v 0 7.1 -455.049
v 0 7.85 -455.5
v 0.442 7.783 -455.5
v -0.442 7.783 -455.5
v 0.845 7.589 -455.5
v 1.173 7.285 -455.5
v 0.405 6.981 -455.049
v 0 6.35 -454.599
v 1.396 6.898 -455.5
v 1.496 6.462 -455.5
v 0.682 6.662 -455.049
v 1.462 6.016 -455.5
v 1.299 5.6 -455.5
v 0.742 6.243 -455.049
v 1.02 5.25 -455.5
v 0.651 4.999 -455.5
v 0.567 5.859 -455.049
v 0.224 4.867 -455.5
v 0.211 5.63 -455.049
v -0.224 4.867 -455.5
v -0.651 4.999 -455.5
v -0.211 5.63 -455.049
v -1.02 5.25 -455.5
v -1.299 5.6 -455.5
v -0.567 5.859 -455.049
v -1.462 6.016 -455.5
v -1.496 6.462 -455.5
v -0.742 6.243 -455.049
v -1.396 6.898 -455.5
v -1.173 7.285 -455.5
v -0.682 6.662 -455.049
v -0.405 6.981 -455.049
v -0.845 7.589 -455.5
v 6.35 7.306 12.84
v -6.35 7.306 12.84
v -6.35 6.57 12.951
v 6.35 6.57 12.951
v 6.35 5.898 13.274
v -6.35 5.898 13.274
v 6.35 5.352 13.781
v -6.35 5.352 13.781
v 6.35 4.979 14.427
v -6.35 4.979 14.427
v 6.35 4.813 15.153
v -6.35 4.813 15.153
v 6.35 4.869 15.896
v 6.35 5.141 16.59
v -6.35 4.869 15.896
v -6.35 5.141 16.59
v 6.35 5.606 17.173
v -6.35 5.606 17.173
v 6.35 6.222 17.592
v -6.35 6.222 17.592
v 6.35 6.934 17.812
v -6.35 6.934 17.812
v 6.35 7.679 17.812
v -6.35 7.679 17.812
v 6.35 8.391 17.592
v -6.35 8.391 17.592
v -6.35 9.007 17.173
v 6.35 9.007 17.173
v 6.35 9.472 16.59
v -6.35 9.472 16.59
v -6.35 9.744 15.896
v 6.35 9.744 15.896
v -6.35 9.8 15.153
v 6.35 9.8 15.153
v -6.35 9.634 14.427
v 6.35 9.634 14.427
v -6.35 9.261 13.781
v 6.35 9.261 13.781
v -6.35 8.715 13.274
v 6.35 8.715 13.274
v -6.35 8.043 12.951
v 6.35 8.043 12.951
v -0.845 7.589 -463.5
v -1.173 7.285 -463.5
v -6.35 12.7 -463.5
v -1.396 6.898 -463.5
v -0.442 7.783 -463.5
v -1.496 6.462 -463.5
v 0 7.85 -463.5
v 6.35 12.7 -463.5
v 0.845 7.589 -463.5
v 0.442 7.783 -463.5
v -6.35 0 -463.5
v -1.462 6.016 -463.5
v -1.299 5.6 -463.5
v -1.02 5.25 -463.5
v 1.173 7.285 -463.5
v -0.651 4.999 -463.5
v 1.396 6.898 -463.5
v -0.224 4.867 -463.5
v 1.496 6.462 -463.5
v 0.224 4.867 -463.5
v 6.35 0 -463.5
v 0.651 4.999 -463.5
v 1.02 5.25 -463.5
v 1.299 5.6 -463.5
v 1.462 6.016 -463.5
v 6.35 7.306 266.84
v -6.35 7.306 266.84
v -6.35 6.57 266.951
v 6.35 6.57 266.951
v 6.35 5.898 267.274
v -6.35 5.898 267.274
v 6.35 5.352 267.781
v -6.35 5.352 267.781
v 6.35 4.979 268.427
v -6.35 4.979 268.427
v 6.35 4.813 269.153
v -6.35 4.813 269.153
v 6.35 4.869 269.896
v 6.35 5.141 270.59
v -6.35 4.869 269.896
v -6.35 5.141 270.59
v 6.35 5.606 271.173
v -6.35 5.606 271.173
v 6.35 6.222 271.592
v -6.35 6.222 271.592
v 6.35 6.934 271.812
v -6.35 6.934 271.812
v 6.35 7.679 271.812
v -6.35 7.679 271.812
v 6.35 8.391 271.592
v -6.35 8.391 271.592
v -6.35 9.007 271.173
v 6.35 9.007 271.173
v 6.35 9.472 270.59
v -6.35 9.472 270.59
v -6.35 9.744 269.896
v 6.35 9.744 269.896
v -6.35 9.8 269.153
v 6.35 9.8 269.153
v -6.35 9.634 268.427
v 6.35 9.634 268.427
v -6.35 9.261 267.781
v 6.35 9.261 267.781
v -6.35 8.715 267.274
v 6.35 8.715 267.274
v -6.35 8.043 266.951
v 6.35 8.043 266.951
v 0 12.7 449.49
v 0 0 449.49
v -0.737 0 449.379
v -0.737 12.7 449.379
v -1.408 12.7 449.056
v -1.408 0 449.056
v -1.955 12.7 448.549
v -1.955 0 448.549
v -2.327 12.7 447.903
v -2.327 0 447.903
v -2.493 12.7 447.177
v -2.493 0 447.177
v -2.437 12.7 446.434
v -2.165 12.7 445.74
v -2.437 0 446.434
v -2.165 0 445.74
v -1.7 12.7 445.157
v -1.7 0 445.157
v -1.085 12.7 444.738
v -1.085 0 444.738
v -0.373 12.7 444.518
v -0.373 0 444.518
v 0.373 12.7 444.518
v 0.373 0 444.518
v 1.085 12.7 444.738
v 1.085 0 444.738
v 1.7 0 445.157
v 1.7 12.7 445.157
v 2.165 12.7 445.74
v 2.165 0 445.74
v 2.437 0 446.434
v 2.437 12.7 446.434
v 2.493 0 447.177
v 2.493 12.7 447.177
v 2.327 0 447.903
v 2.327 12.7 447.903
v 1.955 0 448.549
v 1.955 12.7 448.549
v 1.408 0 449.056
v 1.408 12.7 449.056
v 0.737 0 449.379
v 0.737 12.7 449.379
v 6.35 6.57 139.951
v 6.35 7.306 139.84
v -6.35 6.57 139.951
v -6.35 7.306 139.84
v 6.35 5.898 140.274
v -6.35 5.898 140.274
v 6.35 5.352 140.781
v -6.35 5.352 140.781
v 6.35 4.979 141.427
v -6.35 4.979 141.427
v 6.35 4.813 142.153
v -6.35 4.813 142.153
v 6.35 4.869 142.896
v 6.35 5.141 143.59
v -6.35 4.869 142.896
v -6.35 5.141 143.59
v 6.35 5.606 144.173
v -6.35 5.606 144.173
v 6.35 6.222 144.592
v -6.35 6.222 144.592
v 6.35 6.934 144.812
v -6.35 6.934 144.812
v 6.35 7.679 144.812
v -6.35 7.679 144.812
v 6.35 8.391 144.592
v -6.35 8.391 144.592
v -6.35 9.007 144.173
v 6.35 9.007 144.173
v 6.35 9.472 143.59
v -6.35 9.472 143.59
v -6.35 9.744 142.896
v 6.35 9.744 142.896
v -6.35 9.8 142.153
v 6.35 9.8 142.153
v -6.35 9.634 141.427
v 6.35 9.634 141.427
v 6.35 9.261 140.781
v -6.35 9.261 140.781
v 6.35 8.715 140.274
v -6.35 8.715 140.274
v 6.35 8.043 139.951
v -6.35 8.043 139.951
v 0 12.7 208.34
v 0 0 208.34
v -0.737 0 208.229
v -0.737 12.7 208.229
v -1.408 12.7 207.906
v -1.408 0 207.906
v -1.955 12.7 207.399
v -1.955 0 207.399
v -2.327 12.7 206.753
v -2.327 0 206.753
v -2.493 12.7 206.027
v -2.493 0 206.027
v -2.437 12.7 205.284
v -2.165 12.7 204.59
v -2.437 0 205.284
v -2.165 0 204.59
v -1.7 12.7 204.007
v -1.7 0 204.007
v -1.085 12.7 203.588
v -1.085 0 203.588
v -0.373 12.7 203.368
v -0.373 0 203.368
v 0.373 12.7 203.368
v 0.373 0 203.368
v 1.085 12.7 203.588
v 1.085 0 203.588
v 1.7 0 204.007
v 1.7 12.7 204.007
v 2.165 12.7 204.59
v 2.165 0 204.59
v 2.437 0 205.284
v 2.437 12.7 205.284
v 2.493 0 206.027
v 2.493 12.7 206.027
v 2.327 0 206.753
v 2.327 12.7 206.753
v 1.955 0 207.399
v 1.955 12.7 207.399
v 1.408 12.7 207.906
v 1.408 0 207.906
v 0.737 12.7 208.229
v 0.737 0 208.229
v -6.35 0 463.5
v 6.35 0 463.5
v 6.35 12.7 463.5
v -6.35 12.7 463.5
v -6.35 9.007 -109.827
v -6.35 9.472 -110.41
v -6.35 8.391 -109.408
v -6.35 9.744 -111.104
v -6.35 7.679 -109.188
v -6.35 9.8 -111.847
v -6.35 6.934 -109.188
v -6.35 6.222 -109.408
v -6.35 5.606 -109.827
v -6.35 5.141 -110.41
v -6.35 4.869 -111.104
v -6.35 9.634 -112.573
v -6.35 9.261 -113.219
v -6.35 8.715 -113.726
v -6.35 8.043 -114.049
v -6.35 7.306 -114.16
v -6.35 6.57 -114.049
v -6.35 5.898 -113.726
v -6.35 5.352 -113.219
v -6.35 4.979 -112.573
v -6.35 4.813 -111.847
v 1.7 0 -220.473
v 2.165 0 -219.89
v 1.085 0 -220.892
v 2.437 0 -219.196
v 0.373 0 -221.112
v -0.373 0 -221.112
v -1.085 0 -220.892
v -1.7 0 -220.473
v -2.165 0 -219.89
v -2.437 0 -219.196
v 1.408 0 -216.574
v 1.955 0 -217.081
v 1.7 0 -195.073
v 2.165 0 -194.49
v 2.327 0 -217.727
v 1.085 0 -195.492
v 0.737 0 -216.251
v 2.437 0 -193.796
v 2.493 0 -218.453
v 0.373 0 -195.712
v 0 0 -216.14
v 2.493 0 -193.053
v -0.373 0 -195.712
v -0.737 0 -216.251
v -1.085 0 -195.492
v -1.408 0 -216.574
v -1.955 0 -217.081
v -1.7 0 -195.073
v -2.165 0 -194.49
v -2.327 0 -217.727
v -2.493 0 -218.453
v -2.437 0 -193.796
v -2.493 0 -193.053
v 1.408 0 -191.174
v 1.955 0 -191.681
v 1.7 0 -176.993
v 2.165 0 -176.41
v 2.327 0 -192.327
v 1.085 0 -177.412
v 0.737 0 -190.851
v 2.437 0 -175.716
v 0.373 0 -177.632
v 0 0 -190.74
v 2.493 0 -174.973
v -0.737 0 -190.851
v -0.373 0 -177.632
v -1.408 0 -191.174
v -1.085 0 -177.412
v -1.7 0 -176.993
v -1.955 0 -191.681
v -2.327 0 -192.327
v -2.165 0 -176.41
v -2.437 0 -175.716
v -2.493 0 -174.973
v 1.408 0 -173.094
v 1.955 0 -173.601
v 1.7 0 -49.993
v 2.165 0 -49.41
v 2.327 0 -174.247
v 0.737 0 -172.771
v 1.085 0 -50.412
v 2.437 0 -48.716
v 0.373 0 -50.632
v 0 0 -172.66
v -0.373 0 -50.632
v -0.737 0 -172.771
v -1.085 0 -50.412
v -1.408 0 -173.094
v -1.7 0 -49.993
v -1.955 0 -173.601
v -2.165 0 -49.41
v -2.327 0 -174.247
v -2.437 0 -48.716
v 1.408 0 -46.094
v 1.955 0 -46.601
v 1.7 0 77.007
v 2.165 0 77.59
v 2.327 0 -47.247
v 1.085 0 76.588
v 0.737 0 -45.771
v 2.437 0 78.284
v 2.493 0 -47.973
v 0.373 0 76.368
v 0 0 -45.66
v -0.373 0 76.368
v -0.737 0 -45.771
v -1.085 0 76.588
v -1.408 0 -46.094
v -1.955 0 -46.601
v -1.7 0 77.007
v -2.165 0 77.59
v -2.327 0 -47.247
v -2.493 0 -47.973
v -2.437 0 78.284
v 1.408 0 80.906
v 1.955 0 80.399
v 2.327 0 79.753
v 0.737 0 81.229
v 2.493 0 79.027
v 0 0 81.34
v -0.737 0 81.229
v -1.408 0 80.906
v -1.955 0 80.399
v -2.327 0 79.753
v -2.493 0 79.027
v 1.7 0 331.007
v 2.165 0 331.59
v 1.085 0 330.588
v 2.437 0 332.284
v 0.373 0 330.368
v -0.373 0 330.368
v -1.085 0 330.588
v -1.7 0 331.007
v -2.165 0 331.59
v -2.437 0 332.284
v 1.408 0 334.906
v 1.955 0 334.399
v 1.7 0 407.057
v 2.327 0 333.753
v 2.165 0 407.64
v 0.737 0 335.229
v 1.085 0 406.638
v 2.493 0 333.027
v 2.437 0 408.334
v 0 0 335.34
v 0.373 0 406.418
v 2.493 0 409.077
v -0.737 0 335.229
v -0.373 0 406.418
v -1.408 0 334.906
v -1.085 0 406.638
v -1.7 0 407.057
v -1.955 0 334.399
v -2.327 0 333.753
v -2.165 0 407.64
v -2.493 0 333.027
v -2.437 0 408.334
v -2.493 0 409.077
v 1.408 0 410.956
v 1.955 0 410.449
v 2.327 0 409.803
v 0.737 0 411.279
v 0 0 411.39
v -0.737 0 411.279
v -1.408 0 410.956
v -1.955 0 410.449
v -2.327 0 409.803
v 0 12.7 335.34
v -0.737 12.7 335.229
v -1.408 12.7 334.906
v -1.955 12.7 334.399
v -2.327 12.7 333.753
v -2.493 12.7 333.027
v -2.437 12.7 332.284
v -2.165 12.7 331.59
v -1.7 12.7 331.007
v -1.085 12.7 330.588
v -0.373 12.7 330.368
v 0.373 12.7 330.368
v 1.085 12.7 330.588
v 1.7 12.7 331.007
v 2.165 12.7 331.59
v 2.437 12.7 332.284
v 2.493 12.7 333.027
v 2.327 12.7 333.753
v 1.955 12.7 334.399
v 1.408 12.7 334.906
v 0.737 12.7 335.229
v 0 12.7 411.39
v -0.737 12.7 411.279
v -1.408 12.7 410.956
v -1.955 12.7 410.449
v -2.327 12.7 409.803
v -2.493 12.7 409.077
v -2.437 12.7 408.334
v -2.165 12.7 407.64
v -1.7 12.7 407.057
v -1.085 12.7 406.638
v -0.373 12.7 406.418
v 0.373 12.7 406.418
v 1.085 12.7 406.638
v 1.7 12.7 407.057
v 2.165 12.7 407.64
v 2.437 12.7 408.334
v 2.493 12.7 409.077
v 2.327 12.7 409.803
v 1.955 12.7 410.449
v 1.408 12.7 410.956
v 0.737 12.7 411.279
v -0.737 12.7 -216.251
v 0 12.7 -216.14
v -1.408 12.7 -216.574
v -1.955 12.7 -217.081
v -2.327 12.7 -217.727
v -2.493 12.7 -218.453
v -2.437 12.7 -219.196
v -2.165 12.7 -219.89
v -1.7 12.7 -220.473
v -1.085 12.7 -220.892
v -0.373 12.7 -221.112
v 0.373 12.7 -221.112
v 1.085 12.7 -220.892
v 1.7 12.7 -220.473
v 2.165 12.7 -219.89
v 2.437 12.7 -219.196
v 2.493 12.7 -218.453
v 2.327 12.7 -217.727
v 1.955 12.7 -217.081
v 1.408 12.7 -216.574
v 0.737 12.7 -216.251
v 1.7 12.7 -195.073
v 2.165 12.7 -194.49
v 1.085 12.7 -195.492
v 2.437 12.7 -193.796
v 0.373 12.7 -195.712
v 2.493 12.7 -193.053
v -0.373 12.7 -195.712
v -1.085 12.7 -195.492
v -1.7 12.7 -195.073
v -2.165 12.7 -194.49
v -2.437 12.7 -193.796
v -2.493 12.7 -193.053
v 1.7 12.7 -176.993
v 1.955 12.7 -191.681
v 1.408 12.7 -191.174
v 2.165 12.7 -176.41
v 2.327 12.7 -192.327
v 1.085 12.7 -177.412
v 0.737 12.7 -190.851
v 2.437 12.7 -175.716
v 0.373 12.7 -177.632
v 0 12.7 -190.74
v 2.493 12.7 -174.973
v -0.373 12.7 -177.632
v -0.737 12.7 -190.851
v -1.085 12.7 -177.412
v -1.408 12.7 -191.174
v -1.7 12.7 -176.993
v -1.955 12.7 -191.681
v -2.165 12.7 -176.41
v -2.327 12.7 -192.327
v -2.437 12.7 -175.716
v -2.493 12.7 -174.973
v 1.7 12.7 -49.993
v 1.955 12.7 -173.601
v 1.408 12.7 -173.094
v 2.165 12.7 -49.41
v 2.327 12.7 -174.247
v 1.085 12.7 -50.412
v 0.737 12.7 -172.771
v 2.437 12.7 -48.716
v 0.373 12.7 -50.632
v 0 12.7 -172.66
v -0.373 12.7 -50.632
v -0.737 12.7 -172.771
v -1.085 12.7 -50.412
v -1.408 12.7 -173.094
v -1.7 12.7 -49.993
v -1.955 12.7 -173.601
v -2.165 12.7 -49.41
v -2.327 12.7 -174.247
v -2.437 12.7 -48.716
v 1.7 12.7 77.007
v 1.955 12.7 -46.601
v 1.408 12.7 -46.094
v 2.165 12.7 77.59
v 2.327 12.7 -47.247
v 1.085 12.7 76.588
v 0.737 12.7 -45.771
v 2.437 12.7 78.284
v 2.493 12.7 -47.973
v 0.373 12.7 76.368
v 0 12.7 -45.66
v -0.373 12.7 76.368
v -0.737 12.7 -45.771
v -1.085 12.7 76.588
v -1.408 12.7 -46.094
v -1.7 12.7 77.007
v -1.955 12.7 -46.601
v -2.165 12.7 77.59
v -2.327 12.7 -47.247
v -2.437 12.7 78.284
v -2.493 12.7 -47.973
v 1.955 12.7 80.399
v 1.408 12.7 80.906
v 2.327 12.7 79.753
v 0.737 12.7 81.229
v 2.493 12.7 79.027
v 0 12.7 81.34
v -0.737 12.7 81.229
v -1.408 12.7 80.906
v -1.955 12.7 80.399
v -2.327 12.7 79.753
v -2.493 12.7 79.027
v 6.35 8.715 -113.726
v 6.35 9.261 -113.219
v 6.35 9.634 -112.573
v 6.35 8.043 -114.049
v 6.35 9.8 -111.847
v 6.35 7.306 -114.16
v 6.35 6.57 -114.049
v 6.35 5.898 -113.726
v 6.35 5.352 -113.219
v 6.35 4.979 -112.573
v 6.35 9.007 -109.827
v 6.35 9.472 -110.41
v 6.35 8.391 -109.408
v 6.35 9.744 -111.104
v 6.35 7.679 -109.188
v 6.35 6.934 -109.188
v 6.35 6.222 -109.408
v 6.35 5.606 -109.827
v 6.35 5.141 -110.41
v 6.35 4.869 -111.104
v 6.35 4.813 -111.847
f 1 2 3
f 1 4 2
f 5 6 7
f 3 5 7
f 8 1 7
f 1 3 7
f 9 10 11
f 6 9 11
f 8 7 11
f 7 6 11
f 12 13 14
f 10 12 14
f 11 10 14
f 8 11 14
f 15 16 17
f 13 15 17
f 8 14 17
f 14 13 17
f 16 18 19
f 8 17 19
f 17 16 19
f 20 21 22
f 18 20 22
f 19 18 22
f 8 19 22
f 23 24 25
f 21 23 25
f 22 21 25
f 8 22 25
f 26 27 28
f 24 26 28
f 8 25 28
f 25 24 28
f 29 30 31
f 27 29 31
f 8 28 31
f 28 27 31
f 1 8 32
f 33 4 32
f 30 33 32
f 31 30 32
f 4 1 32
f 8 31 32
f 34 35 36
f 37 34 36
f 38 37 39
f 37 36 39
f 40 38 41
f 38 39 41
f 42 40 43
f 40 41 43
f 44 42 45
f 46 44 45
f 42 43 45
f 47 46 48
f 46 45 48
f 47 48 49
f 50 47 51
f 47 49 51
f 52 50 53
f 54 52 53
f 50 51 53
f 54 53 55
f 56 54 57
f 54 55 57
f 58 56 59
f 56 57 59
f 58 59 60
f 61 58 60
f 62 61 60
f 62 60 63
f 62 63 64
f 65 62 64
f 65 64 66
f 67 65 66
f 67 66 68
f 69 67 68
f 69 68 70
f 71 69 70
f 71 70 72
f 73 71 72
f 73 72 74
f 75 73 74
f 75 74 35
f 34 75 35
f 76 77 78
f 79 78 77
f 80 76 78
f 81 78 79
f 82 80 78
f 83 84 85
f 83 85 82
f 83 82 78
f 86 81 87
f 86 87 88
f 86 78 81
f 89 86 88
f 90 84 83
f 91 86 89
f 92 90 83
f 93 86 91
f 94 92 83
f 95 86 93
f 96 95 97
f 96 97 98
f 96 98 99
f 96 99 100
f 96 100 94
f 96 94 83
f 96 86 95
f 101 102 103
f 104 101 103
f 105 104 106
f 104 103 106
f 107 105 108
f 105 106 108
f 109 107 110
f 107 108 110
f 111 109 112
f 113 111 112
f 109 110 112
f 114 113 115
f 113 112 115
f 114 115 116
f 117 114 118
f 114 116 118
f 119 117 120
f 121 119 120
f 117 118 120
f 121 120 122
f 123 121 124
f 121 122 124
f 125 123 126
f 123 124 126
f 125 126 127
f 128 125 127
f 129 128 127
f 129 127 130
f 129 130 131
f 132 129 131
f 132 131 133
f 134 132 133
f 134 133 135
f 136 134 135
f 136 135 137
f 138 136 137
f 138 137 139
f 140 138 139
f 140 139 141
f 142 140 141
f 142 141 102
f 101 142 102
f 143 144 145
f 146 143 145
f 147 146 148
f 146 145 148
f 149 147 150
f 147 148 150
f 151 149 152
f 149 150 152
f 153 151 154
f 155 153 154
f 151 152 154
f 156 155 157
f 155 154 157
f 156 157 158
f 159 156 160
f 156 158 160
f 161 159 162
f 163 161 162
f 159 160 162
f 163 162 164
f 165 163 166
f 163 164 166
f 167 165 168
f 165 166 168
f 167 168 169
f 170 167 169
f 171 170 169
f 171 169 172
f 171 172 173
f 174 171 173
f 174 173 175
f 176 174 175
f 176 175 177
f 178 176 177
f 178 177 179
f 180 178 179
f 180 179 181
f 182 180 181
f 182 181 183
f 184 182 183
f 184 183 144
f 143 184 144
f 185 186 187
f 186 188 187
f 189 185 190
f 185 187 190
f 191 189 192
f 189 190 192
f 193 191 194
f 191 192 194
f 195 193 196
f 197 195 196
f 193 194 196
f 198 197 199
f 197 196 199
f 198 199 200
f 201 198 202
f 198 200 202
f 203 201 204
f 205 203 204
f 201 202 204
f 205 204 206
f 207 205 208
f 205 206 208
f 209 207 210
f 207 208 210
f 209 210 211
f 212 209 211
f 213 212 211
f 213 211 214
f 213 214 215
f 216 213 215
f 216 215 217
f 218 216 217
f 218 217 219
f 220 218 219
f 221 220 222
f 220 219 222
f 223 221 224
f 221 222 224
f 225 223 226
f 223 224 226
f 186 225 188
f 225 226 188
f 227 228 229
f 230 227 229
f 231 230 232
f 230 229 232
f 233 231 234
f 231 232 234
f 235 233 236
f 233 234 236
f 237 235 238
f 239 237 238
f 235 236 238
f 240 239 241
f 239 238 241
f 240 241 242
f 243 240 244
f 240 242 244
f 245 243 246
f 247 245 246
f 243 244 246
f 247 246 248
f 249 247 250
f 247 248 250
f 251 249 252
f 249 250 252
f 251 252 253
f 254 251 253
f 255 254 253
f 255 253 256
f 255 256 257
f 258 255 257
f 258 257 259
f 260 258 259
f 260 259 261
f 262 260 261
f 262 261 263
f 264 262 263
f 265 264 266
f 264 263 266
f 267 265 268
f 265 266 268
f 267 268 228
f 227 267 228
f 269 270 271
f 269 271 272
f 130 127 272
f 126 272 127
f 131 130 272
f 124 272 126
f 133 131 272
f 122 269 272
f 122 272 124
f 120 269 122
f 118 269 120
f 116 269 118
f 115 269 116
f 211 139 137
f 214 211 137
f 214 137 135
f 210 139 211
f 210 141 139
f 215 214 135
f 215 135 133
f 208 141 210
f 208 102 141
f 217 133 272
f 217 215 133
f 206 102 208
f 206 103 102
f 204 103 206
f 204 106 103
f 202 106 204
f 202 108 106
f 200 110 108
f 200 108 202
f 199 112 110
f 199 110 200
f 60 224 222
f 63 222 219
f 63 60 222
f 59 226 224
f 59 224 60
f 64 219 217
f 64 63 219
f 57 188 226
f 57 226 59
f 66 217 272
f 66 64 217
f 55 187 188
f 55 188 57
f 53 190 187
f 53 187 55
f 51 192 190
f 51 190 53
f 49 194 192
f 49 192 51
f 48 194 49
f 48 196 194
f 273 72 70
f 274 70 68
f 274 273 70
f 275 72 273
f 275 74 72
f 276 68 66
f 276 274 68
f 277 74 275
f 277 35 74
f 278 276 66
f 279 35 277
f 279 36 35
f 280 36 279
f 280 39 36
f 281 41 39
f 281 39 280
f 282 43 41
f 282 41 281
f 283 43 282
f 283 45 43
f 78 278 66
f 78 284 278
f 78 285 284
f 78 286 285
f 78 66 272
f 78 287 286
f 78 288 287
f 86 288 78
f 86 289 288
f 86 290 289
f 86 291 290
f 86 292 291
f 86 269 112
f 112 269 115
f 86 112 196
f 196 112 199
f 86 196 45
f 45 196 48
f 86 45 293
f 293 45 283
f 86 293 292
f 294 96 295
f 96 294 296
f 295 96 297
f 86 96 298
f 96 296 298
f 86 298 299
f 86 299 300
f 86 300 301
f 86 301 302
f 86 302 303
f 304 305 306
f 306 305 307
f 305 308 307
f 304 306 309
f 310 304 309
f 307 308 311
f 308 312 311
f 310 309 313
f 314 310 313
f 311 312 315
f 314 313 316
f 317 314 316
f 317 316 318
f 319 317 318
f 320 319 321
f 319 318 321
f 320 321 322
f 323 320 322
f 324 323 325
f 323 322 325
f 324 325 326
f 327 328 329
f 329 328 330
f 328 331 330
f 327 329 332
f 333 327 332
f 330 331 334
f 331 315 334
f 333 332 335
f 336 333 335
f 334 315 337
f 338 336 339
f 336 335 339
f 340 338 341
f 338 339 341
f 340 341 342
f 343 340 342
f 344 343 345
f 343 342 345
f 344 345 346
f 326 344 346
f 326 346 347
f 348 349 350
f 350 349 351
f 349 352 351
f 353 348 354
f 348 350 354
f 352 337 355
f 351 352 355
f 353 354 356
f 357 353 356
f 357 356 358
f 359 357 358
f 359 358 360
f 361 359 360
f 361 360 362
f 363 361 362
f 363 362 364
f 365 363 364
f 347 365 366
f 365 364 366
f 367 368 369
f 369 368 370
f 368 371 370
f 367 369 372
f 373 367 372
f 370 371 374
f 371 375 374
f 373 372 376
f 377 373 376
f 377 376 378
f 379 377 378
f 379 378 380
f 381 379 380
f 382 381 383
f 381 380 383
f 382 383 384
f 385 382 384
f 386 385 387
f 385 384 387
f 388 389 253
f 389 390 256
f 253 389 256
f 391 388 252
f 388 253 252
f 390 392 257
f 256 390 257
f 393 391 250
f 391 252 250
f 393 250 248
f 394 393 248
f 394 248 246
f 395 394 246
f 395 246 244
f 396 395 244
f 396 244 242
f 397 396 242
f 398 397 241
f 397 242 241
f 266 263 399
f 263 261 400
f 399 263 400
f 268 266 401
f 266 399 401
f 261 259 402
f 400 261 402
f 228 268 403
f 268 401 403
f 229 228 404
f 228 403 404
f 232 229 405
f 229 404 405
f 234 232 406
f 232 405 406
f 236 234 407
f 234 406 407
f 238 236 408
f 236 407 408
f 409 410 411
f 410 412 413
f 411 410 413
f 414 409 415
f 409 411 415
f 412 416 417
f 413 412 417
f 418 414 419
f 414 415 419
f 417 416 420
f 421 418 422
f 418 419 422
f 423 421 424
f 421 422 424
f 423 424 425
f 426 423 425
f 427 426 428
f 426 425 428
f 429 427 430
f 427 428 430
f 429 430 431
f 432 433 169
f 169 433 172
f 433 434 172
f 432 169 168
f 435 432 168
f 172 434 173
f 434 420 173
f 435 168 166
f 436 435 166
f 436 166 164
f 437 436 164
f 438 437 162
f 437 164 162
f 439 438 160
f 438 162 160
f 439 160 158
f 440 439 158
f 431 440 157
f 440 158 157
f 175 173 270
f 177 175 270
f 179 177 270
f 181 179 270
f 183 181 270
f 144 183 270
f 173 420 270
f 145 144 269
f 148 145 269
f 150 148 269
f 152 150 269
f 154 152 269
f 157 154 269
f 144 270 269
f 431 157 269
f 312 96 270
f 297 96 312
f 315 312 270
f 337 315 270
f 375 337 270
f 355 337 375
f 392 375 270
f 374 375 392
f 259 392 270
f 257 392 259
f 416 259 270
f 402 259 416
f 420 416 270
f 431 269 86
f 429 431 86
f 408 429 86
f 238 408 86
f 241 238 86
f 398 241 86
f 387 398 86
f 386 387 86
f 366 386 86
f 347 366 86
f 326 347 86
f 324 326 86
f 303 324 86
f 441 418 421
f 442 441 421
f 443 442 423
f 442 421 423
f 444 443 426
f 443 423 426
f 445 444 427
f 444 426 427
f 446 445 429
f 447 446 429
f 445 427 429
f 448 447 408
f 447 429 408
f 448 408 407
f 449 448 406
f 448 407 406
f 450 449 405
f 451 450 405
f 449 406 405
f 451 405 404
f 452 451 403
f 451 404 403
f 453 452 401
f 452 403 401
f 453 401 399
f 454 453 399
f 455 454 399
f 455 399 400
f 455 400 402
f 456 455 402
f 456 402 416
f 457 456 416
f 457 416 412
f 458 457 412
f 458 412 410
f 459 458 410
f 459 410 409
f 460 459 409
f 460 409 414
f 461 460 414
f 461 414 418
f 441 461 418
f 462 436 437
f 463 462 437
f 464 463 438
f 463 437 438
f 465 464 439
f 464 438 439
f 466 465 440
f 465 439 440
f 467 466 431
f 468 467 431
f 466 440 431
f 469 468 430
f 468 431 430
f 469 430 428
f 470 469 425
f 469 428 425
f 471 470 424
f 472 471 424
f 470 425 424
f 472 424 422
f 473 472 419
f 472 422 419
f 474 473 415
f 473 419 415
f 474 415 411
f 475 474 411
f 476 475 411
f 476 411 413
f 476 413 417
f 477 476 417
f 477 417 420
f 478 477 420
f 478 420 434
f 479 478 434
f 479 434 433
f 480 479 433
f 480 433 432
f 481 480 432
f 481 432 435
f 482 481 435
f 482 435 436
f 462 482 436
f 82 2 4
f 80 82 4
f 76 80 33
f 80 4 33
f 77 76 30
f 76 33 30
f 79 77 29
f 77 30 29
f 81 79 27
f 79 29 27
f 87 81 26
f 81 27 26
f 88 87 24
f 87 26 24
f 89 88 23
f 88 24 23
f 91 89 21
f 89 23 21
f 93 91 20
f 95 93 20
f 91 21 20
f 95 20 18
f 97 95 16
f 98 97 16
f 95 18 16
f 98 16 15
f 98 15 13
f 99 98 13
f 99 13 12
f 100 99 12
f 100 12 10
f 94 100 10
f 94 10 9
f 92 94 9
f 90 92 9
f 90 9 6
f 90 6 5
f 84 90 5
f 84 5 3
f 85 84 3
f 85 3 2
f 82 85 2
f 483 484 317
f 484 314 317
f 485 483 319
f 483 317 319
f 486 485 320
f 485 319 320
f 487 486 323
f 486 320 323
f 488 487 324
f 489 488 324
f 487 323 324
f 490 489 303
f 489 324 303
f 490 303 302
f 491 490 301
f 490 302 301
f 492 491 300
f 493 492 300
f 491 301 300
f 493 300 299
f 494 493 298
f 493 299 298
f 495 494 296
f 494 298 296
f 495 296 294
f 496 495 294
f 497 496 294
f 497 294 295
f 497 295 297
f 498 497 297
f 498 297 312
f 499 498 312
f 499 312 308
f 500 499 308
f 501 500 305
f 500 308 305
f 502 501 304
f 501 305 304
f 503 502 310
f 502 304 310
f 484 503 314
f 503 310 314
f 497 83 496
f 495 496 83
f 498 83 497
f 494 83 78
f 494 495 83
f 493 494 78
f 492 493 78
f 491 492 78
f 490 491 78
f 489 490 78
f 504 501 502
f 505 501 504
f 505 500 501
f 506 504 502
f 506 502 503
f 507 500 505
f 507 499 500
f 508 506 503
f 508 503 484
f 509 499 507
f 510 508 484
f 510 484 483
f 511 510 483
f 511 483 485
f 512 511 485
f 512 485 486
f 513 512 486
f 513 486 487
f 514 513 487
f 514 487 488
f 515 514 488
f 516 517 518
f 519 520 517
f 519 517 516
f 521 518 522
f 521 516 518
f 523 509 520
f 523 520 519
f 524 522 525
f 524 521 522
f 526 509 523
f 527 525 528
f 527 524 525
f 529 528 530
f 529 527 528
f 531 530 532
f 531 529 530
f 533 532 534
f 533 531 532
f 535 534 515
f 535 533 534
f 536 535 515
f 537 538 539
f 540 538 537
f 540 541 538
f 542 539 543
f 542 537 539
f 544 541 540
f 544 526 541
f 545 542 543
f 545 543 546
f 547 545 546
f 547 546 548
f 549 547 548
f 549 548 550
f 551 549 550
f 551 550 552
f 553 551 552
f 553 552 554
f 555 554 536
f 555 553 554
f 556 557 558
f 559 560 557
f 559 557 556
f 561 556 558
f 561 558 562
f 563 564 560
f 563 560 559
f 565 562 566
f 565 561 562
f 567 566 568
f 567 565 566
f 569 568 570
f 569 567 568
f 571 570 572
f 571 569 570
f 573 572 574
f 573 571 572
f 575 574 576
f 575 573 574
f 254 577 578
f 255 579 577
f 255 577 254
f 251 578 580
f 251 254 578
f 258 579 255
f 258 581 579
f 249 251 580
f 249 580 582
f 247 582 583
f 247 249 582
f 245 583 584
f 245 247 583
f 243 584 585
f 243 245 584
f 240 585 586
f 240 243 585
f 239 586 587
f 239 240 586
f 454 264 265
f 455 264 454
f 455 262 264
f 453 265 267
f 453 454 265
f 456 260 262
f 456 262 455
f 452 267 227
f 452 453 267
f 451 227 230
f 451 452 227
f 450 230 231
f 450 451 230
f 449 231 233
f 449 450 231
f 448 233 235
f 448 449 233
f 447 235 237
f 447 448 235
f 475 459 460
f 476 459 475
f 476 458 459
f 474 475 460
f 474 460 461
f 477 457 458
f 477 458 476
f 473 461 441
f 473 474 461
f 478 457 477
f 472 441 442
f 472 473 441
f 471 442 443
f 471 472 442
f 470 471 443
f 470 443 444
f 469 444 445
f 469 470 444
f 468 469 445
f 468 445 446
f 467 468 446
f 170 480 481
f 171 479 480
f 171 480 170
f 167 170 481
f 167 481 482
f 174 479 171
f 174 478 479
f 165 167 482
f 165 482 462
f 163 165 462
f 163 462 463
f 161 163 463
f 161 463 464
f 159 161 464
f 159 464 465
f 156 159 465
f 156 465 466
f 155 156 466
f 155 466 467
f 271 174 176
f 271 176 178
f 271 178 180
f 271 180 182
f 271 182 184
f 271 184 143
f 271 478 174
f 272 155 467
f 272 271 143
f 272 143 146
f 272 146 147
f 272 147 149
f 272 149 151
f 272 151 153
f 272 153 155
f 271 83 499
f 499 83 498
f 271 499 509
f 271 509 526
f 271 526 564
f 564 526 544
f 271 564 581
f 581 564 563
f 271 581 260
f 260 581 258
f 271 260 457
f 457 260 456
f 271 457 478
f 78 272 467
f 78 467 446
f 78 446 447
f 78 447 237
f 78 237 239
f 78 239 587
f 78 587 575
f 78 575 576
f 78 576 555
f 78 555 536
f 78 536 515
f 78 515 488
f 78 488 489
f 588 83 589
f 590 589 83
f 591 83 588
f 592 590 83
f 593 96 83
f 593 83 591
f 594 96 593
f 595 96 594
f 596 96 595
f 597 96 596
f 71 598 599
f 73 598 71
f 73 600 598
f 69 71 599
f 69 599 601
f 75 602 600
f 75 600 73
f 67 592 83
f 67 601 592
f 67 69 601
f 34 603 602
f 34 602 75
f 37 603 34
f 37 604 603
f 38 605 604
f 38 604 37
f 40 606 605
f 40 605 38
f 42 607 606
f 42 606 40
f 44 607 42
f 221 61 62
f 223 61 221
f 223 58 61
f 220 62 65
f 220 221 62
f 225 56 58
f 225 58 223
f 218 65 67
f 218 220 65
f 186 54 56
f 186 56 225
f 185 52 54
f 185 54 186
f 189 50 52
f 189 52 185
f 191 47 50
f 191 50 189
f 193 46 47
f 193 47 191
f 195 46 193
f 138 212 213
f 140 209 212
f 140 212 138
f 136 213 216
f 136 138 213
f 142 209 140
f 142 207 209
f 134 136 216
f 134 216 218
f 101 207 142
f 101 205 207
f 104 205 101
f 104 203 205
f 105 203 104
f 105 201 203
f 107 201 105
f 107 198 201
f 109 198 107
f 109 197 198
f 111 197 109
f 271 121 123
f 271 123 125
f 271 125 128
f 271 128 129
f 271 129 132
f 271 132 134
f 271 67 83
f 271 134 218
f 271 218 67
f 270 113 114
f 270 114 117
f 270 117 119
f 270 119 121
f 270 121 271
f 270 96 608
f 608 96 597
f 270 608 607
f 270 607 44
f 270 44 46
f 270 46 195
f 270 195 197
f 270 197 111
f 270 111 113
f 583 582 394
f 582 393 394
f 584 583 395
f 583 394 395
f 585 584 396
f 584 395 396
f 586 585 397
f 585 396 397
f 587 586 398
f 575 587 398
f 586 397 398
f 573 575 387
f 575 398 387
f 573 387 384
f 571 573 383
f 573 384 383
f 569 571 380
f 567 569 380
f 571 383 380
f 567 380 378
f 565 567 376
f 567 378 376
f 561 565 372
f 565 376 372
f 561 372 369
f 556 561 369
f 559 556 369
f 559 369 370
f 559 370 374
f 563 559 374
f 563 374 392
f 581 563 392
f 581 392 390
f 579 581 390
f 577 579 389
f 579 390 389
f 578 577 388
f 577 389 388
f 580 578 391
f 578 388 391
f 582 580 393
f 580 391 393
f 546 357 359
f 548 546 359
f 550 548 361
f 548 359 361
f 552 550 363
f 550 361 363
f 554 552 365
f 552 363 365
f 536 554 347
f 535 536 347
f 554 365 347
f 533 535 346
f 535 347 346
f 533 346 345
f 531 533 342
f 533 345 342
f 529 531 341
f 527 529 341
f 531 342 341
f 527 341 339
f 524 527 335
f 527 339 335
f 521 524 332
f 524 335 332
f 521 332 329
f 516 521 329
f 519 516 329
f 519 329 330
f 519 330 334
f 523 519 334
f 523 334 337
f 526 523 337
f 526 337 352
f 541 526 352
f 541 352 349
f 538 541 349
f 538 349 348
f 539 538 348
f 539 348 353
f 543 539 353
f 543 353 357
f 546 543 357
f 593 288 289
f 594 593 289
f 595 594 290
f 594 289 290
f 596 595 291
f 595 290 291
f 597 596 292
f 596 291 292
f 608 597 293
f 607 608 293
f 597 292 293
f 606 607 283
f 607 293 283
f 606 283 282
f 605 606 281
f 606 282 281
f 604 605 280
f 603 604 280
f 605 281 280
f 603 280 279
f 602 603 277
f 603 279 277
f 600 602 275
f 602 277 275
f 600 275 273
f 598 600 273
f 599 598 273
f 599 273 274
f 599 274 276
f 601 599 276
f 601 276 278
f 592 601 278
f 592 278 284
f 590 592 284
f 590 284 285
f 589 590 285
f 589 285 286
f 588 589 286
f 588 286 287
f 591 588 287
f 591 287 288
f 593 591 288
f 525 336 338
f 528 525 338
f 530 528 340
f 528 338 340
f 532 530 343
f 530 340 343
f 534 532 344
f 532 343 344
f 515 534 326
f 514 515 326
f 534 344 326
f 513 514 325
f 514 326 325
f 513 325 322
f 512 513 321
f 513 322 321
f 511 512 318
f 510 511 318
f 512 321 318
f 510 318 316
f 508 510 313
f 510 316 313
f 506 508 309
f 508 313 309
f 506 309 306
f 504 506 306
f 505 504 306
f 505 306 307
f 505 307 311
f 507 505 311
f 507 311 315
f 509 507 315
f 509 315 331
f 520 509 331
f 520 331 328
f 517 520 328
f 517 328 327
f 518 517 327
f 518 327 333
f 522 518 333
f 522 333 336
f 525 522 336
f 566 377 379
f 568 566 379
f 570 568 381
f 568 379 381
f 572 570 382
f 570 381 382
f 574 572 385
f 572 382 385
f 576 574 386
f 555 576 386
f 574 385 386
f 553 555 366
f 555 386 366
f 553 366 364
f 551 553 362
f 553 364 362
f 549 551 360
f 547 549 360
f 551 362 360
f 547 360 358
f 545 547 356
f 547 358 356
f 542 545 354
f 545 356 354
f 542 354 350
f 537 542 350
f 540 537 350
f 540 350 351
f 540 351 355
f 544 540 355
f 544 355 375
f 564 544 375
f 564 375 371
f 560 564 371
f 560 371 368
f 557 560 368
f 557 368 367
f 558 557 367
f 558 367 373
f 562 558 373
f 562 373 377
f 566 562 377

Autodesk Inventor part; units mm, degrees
ref_plane "YZ Plane" through (0, 0, 0) normal (1, 0, 0) x (0, 1, 0)
ref_plane "XZ Plane" through (0, 0, 0) normal (0, 1, 0) x (-1, 0, 0)
ref_plane "XY Plane" through (0, 0, 0) normal (0, 0, 1) x (1, 0, 0)
sketch "Sketch1" plane through (0, 0, 0) normal (0, 1, 0) x (-1, 0, 0)
  line L0 (6.35, -463.5) -> (-6.35, -463.5)
  line L1 (-6.35, -463.5) -> (-6.35, 463.5)
  line L2 (-6.35, 463.5) -> (6.35, 463.5)
  line L3 (6.35, 463.5) -> (6.35, -463.5)
  line L4 (6.35, -463.5) -> (-6.35, 463.5) construction
  line L5 (-6.35, -463.5) -> (6.35, 463.5) construction
  point P0 (0, 0)
  dimension "d0" = 12.7
  dimension "d1" = 927
extrude "Extrusion1" add sketch "Sketch1" along normal blind 12.7
sketch "Sketch2" plane through (0, 12.7, 0) normal (0, 1, 0) x (1, 0, 0)
  circle A0 centre (0, -446.99) radius 2.5
  line L0 (-6.35, -463.5) -> (6.35, -463.5) projected
  point P0 (0, 0)
  dimension "d4" = 5
  dimension "d5" = 16.51
sketch "Sketch3" plane through (0, 12.7, 0) normal (0, 1, 0) x (1, 0, 0)
  circle A0 centre (0, -408.89) radius 2.5
  line L0 (-6.35, -463.5) -> (6.35, -463.5) projected
  point P0 (0, 0)
  dimension "d6" = 5
  dimension "d7" = 54.61
sketch "Sketch4" plane through (0, 12.7, 0) normal (0, 1, 0) x (1, 0, 0)
  circle A0 centre (0, -332.84) radius 2.5
  line L0 (-6.35, -463.5) -> (6.35, -463.5) projected
  point P0 (0, 0)
  dimension "d8" = 5
  dimension "d9" = 130.66
sketch "Sketch5" plane through (0, 12.7, 0) normal (0, 1, 0) x (1, 0, 0)
  circle A0 centre (0, -205.84) radius 2.5
  line L0 (-6.35, -463.5) -> (6.35, -463.5) projected
  point P0 (0, 0)
  dimension "d10" = 5
  dimension "d11" = 257.66
sketch "Sketch6" plane through (0, 12.7, 0) normal (0, 1, 0) x (1, 0, 0)
  circle A0 centre (0, -78.84) radius 2.5
  line L0 (-6.35, -463.5) -> (6.35, -463.5) projected
  point P0 (0, 0)
  dimension "d12" = 5
  dimension "d13" = 384.66
sketch "Sketch7" plane through (0, 12.7, 0) normal (0, 1, 0) x (1, 0, 0)
  circle A0 centre (0, 48.16) radius 2.5
  line L0 (-6.35, -463.5) -> (6.35, -463.5) projected
  point P0 (0, 0)
  dimension "d14" = 5
  dimension "d15" = 511.66
sketch "Sketch8" plane through (0, 12.7, 0) normal (0, 1, 0) x (1, 0, 0)
  circle A0 centre (0, 175.16) radius 2.5
  line L0 (-6.35, -463.5) -> (6.35, -463.5) projected
  point P0 (0, 0)
  dimension "d16" = 5
  dimension "d17" = 638.66
sketch "Sketch9" plane through (0, 12.7, 0) normal (0, 1, 0) x (1, 0, 0)
  circle A0 centre (0, 193.24) radius 2.5
  line L0 (-6.35, -463.5) -> (6.35, -463.5) projected
  point P0 (0, 0)
  dimension "d18" = 5
  dimension "d19" = 656.74
sketch "Sketch10" plane through (0, 12.7, 0) normal (0, 1, 0) x (1, 0, 0)
  circle A0 centre (0, 218.64) radius 2.5
  line L0 (-6.35, -463.5) -> (6.35, -463.5) projected
  point P0 (0, 0)
  dimension "d20" = 5
  dimension "d21" = 682.14
hole "Hole1" at (0, 12.7, 446.99) direction (0, -1, 0) diameter 5 end through all
hole "Hole2" at (0, 12.7, 408.89) direction (0, -1, 0) diameter 5 end through all
hole "Hole3" at (0, 12.7, 332.84) direction (0, -1, 0) diameter 5 end through all
hole "Hole4" at (0, 12.7, 205.84) direction (0, -1, 0) diameter 5 end through all
hole "Hole5" at (0, 12.7, 78.84) direction (0, -1, 0) diameter 5 end through all
hole "Hole6" at (0, 12.7, -48.16) direction (0, -1, 0) diameter 5 end through all
hole "Hole7" at (0, 12.7, -175.16) direction (0, -1, 0) diameter 5 end through all
hole "Hole8" at (0, 12.7, -193.24) direction (0, -1, 0) diameter 5 end through all
hole "Hole9" at (0, 12.7, -218.64) direction (0, -1, 0) diameter 5 end through all
sketch "Sketch11" plane through (6.35, 0, -463.5) normal (0, 0, -1) x (-1, 0, 0)
  circle A0 centre (6.35, 6.35) radius 1.5
  line L0 (0, 0) -> (0, 12.7) projected
  point P0 (6.35, 0)
  dimension "d85" = 3
  dimension "d86" = 6.35
  dimension "d87" = 6.35
hole "Hole10" at (0, 6.35, -463.5) direction (0, 0, 1) diameter 3 depth 8 tip angle 118
thread "Thread1" size "M3x0.5" class "6H" standard "ANSI Metric M Profile" full length
sketch "Sketch12" plane through (6.35, 0, 463.5) normal (1, 0, 0) x (0, 0, -1)
  circle A0 centre (194.16, 7.3065) radius 2.5
  line L0 (0, 0) -> (0, 12.7) projected
  point P0 (463.5, 0)
  dimension "d97" = 5
  dimension "d98" = 194.16
sketch "Sketch13" plane through (6.35, 0, 463.5) normal (1, 0, 0) x (0, 0, -1)
  circle A0 centre (321.16, 7.3065) radius 2.5
  line L0 (0, 0) -> (0, 12.7) projected
  point P0 (463.5, 0)
  dimension "d99" = 5
  dimension "d100" = 321.16
sketch "Sketch14" plane through (6.35, 0, 463.5) normal (1, 0, 0) x (0, 0, -1)
  circle A0 centre (448.16, 7.3065) radius 2.5
  line L0 (0, 0) -> (0, 12.7) projected
  point P0 (463.5, 0)
  dimension "d101" = 5
  dimension "d102" = 448.16
sketch "Sketch15" plane through (6.35, 0, 463.5) normal (1, 0, 0) x (0, 0, -1)
  circle A0 centre (575.16, 7.3065) radius 2.5
  line L0 (0, 0) -> (0, 12.7) projected
  point P0 (463.5, 0)
  dimension "d103" = 5
  dimension "d104" = 575.16
hole "Hole11" at (6.35, 7.3065, 269.34) direction (-1, 0, 0) diameter 5 end through all
hole "Hole12" at (6.35, 7.3065, 142.34) direction (-1, 0, 0) diameter 5 end through all
hole "Hole13" at (6.35, 7.3065, 15.34) direction (-1, 0, 0) diameter 5 end through all
hole "Hole14" at (6.35, 7.3065, -111.66) direction (-1, 0, 0) diameter 5 end through all
properties part number "Plate Support"
